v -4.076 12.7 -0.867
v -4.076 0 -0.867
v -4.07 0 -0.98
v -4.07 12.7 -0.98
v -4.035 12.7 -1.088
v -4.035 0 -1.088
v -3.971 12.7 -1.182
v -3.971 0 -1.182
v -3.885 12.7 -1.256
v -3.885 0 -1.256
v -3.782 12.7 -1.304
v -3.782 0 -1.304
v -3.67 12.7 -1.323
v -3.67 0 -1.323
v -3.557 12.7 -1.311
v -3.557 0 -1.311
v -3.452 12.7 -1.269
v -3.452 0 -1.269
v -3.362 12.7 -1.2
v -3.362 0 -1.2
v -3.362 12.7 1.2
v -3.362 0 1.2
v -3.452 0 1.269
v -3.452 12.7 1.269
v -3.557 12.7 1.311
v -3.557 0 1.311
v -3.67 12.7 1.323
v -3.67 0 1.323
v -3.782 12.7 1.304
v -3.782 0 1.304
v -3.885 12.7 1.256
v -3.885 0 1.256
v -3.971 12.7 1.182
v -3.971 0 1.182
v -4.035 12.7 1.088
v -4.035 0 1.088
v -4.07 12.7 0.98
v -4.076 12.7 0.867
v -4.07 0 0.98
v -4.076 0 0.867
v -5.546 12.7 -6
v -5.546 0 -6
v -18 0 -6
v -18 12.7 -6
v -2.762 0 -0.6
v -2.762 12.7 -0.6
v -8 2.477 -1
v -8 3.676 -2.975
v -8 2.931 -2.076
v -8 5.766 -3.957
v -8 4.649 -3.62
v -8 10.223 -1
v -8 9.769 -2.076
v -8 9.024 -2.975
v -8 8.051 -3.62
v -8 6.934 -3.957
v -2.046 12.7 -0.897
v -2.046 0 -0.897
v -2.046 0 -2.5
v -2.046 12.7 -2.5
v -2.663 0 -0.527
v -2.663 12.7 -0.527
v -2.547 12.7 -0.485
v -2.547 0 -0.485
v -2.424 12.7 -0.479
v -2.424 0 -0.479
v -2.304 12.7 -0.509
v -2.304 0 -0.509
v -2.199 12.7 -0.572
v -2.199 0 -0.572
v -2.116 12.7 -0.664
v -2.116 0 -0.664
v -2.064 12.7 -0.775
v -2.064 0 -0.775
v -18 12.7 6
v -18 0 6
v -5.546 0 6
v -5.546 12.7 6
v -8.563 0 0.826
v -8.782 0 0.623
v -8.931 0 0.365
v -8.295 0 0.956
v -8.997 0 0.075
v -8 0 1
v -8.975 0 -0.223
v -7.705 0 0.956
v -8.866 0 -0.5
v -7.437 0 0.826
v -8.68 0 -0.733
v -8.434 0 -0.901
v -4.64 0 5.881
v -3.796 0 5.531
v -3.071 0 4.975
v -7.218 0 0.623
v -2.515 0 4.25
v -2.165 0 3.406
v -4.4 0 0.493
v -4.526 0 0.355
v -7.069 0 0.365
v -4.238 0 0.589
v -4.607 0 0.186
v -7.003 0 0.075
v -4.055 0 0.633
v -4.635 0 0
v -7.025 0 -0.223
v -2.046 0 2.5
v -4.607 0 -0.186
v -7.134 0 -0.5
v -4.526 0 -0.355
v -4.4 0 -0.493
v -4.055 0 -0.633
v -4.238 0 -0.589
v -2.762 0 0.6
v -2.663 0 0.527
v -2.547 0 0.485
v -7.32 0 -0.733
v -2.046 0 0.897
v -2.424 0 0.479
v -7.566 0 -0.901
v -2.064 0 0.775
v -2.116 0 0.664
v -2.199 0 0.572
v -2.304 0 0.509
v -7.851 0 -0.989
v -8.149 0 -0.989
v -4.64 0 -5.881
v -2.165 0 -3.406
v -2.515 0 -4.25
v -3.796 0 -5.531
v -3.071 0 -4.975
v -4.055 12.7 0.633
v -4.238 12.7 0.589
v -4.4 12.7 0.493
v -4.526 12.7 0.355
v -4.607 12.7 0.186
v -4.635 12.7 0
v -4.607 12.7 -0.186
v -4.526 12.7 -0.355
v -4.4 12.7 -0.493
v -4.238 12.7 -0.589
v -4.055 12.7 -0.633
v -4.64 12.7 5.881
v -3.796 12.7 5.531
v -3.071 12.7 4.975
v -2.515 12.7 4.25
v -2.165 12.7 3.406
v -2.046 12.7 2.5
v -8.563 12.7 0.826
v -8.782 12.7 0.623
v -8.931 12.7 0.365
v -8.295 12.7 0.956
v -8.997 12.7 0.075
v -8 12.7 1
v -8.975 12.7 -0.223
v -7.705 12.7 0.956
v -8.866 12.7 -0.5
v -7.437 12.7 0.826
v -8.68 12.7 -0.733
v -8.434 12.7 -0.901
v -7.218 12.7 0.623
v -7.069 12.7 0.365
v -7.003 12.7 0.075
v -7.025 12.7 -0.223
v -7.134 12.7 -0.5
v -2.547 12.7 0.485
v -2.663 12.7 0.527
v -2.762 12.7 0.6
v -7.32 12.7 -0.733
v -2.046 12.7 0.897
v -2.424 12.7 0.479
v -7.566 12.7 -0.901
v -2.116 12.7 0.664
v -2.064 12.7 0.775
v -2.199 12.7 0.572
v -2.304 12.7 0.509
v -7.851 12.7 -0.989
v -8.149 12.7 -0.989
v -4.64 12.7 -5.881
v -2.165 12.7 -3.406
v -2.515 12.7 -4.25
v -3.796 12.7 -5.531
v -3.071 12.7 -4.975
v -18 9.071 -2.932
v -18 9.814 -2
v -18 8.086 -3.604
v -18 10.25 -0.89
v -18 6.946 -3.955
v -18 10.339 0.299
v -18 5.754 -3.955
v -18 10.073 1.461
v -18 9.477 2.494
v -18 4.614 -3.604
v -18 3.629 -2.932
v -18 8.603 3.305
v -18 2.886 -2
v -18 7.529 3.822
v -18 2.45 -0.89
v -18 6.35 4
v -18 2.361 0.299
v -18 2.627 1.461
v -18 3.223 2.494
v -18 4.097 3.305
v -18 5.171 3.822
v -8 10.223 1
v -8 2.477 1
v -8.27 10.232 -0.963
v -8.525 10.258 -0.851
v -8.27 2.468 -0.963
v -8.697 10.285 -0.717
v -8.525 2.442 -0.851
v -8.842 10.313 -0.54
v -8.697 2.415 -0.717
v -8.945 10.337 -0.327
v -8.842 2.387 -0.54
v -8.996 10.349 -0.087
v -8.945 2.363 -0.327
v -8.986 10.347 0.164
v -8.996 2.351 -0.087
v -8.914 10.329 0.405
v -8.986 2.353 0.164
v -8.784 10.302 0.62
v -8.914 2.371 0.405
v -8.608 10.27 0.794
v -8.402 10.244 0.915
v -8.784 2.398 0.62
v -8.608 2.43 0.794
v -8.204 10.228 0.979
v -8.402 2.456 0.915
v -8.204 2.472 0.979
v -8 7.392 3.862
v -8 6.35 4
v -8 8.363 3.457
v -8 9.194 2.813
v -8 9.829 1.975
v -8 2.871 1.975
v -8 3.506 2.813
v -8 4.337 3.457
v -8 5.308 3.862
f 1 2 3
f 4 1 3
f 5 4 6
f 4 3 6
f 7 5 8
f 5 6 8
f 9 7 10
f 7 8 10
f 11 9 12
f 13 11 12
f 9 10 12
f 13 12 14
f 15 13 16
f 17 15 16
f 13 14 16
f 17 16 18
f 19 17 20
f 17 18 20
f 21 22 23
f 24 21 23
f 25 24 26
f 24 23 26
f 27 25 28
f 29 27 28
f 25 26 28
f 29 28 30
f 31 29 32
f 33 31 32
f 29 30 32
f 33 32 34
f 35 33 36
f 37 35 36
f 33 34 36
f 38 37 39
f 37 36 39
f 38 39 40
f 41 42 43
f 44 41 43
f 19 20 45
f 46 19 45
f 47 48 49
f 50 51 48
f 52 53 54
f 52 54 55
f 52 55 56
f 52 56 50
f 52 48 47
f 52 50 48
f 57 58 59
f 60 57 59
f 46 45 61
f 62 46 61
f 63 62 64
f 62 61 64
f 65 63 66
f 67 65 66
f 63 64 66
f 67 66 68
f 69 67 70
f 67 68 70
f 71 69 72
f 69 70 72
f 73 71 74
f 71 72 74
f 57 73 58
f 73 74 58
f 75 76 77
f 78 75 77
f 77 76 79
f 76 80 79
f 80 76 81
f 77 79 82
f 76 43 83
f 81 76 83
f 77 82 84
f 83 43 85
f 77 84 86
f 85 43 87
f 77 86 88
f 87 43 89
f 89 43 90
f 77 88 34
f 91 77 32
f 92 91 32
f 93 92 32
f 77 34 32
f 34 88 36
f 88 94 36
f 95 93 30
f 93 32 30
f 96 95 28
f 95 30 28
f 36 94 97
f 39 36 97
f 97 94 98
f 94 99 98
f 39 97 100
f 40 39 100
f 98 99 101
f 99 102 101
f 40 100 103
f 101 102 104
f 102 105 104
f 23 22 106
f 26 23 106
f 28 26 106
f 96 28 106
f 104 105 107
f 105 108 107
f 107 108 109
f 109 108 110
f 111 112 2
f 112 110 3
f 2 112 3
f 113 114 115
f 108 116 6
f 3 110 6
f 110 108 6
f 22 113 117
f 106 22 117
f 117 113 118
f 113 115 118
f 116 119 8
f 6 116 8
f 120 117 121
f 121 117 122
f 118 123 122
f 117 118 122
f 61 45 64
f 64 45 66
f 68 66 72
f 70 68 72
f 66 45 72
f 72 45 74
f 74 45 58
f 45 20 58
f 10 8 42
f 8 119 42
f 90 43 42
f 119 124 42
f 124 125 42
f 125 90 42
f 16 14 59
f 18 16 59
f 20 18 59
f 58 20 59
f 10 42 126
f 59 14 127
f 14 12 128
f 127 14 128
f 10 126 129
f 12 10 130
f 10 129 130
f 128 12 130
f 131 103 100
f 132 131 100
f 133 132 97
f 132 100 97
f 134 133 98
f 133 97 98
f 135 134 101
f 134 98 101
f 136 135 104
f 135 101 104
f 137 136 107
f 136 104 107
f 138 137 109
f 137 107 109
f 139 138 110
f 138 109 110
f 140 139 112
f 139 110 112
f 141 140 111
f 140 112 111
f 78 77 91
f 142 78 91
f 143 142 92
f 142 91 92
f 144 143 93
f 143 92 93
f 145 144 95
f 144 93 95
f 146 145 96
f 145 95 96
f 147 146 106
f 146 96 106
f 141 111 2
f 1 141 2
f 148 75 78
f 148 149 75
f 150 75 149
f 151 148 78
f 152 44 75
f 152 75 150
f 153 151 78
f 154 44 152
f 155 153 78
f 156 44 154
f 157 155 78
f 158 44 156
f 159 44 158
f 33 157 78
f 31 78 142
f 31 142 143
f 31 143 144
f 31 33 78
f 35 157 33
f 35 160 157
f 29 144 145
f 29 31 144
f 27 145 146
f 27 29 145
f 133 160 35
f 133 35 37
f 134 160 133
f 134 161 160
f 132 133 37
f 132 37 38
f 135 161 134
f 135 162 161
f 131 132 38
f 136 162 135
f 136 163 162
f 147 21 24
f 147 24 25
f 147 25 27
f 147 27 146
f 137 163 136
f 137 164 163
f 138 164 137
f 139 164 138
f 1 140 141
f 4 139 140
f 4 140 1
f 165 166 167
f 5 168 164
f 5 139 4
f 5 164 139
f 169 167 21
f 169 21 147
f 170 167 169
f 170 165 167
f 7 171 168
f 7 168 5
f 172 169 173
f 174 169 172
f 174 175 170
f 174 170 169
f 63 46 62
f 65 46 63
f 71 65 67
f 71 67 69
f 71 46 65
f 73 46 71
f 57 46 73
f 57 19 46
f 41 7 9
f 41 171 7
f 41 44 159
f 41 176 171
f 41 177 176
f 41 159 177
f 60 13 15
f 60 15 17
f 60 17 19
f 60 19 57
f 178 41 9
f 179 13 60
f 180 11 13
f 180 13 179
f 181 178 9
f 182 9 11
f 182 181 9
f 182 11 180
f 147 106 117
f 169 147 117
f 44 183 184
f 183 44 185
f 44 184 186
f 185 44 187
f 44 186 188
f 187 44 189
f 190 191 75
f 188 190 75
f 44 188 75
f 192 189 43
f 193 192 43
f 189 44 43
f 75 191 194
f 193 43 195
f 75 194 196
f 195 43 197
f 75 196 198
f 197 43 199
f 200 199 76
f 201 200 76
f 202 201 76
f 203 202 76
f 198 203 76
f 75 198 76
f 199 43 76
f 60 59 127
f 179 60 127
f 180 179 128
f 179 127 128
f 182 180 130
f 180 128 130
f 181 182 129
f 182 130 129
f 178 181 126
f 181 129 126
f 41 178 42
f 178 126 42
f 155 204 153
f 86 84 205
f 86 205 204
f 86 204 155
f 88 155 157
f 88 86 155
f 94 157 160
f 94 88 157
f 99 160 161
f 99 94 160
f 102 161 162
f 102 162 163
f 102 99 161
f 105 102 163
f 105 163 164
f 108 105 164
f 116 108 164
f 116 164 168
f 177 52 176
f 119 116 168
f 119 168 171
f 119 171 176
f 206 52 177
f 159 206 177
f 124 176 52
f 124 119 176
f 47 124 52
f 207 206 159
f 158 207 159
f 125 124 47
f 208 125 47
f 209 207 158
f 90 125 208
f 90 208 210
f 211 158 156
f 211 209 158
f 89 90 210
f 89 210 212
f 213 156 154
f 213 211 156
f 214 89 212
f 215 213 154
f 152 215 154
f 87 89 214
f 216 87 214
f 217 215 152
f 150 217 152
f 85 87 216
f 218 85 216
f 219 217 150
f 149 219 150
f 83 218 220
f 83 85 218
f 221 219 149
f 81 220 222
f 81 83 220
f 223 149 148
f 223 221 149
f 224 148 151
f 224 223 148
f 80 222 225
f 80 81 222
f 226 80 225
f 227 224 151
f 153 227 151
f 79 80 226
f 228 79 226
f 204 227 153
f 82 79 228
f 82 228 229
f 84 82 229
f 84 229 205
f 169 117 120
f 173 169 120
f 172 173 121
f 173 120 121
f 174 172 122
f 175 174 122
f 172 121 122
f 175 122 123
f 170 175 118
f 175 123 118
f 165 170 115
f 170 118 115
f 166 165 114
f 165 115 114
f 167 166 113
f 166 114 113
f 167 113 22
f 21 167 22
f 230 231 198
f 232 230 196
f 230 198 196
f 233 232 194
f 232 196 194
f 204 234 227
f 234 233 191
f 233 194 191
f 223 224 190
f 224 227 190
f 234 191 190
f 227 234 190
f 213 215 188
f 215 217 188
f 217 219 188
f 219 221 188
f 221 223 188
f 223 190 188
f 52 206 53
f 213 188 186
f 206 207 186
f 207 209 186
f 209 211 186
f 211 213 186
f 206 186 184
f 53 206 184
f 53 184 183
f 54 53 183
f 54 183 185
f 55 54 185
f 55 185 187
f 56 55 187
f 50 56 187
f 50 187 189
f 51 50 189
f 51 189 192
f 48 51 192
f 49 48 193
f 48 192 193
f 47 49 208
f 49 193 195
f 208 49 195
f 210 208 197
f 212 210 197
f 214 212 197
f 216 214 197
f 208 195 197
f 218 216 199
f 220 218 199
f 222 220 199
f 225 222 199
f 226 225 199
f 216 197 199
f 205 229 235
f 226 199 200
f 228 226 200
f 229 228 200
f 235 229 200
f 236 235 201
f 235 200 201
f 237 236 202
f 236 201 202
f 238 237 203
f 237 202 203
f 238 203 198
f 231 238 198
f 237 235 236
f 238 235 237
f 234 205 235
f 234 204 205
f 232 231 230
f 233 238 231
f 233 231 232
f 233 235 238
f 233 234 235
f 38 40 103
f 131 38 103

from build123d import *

# Parameters (mm, degrees)
SKETCH1_R           = 1
BOSS_EXTRUDE1_DEPTH = 12.7
SKETCH2_R           = 4
CUT_EXTRUDE1_DEPTH  = 10


with BuildPart() as part:
    # Sketch1 → Boss-Extrude1 (new body)
    with BuildSketch(Plane(origin=(0, 0, 0), x_dir=(1, 0, 0), z_dir=(0, 1, 0))):
        with BuildLine():
            Line((-4.055343897, 0.632583633), (-4.075844459, 0.866906139))
            ThreePointArc((-4.075844459, 0.866906139), (-3.83530083, 1.283539926), (-3.361522369, 1.2))
            Line((-3.361522369, 1.2), (-2.761522369, 0.6))
            ThreePointArc((-2.761522369, 0.6), (-2.304491577, 0.509090923), (-2.04560443, 0.89654292))
            Line((-2.04560443, 0.89654292), (-2.04560443, 2.5))
            ThreePointArc((-2.04560443, 2.5), (-3.070730696, 4.974873734), (-5.54560443, 6))
            Line((-5.54560443, 6), (-18, 6))
            Line((-18, 6), (-18, -6))
            Line((-18, -6), (-5.54560443, -6))
            ThreePointArc((-5.54560443, -6), (-3.070730696, -4.974873734), (-2.04560443, -2.5))
            Line((-2.04560443, -2.5), (-2.04560443, -0.89654292))
            ThreePointArc((-2.04560443, -0.89654292), (-2.304491577, -0.509090923), (-2.761522369, -0.6))
            Line((-2.761522369, -0.6), (-3.361522369, -1.2))
            ThreePointArc((-3.361522369, -1.2), (-3.83530083, -1.283539926), (-4.075844459, -0.866906139))
            Line((-4.075844459, -0.866906139), (-4.055343897, -0.632583633))
            ThreePointArc((-4.055343897, -0.632583633), (-4.635, 0), (-4.055343897, 0.632583633))
        make_face()
        with Locations(Location((-8, 0, 0), (0, 0, 270))):
            Circle(SKETCH1_R, mode=Mode.SUBTRACT)
    extrude(amount=BOSS_EXTRUDE1_DEPTH)

    # Sketch2 → Cut-Extrude1 (cut)
    with BuildSketch(Plane.ZY.offset(18)):
        with Locations((0, 6.35)):
            Circle(SKETCH2_R)
    extrude(amount=-CUT_EXTRUDE1_DEPTH, mode=Mode.SUBTRACT)


solid = part.part
